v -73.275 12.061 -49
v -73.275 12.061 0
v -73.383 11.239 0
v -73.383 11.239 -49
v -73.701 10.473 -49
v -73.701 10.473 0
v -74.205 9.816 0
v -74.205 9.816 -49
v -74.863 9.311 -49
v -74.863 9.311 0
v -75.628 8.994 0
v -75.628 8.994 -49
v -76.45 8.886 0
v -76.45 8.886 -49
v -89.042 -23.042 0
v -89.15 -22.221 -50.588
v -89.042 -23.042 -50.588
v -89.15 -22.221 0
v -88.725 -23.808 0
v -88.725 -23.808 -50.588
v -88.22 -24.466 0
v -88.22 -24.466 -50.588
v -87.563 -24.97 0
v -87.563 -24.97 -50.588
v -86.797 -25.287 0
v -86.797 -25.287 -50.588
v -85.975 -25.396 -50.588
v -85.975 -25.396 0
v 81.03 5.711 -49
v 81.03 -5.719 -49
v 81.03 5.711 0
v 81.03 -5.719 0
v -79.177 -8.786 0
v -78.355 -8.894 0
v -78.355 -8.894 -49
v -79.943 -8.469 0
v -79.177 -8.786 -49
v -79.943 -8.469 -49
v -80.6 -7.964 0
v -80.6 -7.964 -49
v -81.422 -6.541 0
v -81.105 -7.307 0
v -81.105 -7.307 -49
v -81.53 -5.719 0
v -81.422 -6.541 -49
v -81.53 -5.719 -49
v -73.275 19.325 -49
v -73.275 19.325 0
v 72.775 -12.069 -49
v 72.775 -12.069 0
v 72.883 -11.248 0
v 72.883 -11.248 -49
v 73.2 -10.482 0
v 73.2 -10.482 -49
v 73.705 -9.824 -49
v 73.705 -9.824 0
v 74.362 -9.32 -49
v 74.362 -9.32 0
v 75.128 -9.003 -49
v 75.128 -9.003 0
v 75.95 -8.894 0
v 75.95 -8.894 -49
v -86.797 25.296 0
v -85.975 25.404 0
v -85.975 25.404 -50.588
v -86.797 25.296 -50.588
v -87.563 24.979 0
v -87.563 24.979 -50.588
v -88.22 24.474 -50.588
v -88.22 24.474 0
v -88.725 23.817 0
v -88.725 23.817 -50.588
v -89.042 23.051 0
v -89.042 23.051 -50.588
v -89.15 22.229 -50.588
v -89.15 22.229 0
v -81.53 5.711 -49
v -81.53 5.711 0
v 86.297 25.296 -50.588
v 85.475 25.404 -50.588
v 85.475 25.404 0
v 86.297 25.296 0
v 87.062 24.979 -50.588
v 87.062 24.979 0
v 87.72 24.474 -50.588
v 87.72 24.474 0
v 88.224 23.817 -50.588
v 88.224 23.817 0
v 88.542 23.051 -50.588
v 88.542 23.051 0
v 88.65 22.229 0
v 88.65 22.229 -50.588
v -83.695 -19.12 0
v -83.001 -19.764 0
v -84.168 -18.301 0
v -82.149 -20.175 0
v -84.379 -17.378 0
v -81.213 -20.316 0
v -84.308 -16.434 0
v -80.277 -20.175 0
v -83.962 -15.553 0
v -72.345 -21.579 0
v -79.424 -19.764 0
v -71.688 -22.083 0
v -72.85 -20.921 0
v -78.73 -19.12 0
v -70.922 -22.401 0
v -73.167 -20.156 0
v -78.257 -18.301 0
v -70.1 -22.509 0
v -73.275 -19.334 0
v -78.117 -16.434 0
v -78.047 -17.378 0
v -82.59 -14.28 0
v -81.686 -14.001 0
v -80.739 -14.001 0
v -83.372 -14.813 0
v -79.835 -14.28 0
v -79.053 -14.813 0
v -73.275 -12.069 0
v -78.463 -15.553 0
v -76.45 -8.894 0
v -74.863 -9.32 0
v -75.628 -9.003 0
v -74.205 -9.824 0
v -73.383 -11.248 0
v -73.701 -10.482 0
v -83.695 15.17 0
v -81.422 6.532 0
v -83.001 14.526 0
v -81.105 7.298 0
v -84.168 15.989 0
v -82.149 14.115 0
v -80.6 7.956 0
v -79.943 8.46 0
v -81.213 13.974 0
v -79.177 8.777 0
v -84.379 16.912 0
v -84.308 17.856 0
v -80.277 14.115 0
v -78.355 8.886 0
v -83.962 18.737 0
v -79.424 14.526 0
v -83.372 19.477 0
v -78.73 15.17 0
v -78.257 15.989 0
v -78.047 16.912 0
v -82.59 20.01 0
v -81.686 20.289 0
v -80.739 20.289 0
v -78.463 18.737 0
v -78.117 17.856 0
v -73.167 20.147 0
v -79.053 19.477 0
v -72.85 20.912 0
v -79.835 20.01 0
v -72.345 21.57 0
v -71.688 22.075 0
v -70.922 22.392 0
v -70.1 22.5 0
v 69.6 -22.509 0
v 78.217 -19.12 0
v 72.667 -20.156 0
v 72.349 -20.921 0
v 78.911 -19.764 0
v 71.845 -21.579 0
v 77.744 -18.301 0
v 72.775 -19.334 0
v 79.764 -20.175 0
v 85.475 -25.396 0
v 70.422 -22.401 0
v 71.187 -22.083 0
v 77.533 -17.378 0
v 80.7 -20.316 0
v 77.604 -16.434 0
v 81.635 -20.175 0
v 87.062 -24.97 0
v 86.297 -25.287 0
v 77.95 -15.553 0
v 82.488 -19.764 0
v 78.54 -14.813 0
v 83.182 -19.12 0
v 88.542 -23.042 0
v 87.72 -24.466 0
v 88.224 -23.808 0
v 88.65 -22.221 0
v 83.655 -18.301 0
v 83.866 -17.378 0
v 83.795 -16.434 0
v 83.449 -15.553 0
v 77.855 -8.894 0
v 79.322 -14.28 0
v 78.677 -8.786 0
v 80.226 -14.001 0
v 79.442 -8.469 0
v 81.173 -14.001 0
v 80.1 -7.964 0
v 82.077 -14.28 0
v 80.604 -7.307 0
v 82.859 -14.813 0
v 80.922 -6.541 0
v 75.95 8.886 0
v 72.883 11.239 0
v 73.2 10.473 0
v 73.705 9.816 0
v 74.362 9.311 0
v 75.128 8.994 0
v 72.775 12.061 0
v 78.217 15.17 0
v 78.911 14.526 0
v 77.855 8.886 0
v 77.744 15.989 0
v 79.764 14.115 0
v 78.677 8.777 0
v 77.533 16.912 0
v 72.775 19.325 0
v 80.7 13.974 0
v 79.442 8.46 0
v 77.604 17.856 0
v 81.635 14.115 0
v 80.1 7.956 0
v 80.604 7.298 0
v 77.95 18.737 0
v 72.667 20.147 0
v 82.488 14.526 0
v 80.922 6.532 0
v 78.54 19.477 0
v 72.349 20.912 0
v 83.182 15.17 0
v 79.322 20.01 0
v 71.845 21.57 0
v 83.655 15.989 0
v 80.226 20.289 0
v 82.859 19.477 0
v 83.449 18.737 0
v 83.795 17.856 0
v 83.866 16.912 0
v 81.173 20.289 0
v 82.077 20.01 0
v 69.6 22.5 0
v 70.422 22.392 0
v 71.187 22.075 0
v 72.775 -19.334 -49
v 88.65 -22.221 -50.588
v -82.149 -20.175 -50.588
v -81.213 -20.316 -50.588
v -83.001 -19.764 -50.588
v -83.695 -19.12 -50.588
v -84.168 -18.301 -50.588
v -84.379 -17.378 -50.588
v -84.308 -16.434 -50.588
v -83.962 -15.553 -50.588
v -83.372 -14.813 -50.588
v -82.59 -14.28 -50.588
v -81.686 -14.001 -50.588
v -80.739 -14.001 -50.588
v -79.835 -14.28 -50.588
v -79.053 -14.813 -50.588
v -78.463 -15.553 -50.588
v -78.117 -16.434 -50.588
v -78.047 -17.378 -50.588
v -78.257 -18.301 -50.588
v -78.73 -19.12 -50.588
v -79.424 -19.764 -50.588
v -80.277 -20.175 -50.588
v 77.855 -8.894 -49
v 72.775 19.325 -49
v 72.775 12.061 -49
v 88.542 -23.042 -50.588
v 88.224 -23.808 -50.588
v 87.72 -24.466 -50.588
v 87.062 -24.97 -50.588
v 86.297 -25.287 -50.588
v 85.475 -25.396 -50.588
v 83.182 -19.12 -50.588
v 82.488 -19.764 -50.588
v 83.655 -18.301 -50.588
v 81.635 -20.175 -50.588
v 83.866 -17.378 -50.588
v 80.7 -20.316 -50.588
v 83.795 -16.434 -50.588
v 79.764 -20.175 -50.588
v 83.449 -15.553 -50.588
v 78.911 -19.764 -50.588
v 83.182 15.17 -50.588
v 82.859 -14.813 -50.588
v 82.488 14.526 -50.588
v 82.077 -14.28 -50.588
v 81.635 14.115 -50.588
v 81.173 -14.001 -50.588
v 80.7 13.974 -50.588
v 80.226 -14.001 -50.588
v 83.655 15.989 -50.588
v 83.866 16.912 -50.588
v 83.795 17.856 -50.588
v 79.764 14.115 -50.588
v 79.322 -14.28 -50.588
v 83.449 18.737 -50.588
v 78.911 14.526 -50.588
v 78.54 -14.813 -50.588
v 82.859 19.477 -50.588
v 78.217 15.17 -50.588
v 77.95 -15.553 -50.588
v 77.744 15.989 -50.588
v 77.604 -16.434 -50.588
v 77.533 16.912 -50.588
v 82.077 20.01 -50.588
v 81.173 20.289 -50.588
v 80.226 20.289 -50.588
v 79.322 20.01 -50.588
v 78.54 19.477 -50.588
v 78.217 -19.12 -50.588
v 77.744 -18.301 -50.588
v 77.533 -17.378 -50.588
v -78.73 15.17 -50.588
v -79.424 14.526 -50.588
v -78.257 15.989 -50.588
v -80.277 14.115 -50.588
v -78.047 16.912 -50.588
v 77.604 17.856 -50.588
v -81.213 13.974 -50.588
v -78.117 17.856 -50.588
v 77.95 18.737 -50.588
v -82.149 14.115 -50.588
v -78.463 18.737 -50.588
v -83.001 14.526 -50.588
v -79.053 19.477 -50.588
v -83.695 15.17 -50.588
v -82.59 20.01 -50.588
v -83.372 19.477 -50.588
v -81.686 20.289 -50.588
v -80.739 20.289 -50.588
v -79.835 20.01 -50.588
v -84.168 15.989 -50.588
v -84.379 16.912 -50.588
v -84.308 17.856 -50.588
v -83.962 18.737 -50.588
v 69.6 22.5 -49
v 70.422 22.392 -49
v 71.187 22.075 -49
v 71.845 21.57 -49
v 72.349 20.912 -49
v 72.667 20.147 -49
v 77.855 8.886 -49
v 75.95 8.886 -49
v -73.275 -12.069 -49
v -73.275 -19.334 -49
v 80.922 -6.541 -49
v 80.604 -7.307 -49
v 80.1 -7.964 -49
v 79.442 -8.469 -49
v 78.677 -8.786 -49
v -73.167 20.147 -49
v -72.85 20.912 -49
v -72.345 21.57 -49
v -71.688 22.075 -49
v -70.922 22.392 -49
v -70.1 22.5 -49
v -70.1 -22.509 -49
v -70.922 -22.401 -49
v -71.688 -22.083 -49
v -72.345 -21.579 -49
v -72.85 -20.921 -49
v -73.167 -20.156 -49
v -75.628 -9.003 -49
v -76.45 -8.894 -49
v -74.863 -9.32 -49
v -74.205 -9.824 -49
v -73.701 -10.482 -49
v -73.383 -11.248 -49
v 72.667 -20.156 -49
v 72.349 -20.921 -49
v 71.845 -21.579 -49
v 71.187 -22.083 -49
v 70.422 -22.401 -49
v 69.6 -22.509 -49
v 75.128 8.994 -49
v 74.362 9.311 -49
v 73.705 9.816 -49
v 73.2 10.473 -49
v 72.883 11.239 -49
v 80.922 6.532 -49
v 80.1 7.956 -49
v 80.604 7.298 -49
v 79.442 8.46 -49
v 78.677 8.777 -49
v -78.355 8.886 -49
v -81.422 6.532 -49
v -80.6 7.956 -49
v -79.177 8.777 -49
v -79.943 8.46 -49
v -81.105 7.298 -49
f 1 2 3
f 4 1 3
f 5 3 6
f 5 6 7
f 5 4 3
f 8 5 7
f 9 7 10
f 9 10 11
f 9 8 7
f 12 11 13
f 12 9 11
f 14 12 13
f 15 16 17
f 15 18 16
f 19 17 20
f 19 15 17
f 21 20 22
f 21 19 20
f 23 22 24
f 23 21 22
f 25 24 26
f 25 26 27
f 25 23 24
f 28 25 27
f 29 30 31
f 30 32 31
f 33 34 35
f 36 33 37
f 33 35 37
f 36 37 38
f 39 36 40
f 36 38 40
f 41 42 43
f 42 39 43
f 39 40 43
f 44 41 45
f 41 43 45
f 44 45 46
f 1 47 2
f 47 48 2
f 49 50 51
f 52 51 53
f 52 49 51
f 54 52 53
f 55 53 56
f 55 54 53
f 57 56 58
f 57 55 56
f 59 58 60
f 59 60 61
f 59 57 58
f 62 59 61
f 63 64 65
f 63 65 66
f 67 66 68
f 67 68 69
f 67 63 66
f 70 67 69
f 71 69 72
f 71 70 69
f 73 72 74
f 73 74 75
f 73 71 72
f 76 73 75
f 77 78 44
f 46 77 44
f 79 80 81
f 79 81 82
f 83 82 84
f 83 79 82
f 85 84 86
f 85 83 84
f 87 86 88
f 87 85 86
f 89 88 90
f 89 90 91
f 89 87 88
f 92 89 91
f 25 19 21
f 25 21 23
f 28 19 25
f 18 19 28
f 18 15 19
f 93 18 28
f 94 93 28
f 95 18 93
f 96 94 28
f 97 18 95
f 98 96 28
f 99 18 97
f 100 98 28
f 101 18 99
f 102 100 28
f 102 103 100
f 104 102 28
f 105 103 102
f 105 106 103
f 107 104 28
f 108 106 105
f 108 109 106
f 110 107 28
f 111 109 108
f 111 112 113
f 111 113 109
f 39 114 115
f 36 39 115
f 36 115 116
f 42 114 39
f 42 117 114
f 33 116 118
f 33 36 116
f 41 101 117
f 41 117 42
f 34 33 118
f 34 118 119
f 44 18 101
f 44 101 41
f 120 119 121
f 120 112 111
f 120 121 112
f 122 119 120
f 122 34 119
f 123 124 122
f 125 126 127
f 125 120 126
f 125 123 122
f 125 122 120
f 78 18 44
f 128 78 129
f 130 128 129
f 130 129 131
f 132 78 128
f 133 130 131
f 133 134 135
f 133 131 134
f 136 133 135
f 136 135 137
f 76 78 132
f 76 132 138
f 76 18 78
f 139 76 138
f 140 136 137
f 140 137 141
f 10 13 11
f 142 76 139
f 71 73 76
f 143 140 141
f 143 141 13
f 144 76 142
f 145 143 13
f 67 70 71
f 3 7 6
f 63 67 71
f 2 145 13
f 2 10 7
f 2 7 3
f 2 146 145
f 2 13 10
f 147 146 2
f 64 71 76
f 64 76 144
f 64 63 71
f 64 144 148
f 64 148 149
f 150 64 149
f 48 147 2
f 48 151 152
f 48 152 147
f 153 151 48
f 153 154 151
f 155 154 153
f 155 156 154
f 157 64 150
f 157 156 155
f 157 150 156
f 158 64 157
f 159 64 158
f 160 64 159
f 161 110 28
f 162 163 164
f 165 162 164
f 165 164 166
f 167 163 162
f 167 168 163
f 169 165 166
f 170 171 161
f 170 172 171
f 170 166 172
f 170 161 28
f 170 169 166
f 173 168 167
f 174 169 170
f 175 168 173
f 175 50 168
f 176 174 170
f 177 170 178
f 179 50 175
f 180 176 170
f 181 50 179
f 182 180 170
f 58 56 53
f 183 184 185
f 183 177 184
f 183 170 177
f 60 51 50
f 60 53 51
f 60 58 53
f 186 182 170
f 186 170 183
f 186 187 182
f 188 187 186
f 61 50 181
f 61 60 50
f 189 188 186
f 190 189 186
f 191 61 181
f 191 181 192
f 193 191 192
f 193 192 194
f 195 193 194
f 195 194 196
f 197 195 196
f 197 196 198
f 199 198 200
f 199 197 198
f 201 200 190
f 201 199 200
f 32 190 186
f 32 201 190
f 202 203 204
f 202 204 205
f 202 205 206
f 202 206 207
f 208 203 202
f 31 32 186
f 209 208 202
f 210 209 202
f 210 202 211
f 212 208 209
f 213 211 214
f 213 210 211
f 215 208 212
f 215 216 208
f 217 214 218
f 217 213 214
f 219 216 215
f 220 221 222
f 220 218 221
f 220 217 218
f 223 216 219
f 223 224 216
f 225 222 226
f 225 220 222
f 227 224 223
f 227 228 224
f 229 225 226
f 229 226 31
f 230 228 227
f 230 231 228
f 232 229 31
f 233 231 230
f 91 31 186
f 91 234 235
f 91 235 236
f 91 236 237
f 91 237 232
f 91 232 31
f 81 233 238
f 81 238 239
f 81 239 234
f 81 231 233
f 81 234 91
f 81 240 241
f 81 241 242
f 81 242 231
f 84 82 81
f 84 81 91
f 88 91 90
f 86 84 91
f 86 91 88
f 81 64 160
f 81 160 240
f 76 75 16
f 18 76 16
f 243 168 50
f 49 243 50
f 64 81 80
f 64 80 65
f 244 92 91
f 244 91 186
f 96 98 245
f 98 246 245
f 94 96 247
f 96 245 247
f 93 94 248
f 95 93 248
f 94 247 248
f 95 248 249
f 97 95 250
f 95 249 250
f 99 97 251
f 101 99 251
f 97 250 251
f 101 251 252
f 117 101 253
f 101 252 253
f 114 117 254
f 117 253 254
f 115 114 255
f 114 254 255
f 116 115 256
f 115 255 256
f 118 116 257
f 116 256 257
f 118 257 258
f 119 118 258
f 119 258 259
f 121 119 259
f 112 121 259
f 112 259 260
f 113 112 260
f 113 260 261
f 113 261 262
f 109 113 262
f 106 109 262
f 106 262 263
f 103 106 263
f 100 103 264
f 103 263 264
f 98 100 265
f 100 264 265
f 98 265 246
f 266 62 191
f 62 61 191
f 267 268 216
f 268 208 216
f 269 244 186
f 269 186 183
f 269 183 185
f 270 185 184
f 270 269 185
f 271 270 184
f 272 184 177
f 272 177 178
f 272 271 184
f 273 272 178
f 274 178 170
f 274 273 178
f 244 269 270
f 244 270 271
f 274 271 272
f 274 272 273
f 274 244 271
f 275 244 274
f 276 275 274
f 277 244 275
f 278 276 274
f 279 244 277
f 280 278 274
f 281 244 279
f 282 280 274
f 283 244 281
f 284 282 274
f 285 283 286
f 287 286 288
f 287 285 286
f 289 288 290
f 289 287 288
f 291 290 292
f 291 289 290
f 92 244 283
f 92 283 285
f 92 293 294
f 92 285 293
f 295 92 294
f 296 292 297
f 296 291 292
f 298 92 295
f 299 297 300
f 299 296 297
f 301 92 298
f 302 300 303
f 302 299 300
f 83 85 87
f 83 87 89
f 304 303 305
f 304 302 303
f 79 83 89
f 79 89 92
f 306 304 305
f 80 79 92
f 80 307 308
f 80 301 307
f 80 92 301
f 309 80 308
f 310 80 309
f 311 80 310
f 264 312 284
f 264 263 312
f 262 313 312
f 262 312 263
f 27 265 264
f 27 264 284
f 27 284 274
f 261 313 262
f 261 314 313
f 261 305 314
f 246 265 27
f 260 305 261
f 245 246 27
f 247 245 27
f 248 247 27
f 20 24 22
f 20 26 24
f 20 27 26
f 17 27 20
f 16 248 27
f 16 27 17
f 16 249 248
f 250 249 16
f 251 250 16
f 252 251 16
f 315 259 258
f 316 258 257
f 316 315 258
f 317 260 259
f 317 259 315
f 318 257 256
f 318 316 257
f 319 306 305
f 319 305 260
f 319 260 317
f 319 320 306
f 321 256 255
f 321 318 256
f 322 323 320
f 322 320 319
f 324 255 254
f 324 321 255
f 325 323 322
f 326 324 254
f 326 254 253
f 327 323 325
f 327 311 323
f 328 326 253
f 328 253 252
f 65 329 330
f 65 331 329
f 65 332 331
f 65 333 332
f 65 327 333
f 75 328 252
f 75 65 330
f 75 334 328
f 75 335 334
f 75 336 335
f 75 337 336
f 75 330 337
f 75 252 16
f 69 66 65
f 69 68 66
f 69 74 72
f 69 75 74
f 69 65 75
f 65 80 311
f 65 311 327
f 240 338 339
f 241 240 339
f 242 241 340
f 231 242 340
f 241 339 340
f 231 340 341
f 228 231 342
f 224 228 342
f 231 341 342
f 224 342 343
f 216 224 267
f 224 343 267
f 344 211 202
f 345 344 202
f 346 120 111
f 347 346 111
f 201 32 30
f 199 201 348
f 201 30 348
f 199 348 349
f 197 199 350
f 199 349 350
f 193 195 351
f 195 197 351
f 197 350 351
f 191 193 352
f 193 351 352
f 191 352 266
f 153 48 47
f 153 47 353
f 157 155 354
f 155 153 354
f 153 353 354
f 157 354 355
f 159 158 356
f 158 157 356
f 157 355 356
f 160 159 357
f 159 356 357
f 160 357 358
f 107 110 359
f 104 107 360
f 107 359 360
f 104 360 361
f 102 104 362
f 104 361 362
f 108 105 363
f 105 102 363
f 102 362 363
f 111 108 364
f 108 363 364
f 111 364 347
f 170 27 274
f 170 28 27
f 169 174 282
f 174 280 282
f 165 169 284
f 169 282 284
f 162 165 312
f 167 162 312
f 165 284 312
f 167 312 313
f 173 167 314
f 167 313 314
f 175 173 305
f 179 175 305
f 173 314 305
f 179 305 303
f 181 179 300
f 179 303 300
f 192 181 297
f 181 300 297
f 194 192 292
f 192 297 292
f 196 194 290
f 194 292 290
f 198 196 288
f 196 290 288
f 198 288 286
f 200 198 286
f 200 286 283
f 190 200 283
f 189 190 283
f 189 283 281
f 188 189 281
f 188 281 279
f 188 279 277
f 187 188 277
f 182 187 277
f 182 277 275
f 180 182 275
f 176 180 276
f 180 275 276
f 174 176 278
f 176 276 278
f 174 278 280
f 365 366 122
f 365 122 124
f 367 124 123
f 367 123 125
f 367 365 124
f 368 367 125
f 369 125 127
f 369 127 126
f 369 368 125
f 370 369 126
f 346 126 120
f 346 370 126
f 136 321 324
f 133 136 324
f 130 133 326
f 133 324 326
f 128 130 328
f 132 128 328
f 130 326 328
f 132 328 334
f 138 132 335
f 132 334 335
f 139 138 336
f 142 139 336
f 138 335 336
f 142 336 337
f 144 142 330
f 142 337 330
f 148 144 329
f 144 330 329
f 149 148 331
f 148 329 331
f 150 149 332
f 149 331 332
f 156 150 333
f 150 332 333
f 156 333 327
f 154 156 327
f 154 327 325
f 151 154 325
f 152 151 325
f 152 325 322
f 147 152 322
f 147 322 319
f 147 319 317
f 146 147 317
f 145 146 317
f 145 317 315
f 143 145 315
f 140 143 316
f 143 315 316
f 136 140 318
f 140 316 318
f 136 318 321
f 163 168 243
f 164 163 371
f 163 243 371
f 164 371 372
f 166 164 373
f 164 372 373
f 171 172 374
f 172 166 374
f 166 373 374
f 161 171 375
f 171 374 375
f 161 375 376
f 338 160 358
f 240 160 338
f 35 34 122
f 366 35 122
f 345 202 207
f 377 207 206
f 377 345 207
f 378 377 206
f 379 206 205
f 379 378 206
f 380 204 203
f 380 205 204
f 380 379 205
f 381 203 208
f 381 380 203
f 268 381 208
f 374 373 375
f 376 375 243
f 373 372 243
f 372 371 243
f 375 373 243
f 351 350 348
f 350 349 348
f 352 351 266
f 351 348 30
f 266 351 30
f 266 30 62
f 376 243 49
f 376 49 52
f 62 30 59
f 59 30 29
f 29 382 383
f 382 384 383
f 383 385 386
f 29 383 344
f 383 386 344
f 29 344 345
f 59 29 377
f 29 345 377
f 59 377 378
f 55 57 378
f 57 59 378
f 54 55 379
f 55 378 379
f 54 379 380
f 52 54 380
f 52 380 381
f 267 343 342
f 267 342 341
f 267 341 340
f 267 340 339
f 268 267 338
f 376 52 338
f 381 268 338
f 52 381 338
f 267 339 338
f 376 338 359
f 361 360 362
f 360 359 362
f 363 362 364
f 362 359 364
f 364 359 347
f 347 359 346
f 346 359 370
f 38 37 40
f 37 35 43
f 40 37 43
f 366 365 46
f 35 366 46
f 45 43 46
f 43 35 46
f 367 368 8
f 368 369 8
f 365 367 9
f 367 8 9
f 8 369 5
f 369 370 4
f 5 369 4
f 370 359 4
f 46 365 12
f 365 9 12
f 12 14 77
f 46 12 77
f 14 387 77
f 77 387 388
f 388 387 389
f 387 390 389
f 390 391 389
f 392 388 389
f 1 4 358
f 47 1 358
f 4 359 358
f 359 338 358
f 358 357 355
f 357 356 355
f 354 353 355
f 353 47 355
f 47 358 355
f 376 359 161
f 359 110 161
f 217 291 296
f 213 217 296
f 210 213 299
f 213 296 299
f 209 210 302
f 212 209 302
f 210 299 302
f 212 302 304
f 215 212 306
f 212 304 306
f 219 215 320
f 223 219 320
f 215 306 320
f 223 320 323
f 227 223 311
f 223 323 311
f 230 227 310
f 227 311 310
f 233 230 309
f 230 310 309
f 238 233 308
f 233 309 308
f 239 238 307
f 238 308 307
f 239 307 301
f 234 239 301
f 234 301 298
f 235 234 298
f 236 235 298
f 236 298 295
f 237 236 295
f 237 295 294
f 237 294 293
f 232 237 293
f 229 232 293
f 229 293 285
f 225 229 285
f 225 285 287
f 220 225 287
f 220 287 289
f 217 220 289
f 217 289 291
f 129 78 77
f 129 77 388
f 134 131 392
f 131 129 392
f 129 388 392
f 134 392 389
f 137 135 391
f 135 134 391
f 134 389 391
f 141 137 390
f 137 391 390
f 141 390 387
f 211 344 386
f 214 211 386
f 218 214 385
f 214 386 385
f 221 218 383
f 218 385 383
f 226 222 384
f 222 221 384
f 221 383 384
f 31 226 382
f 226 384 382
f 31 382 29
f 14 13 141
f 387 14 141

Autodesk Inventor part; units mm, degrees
ref_plane "YZ Plane" through (0, 0, 0) normal (1, 0, 0) x (0, 1, 0)
ref_plane "XZ Plane" through (0, 0, 0) normal (0, 1, 0) x (-1, 0, 0)
sketch "Sketch1" plane through (0, 0, 0) normal (0, 0, 1) x (1, 0, 0)
  arc A0 (68.5, 19.5) -> (65.5, 22.5) centre (65.5, 19.5) ccw projected
  line L0 (-65.5, 22.5) -> (65.5, 22.5) projected
  arc A1 (-65.5, 22.5) -> (-68.5, 19.5) centre (-65.5, 19.5) ccw projected
  line L1 (-68.5, -19.5) -> (-68.5, 19.5) projected
  arc A2 (-68.5, -19.5) -> (-65.5, -22.5) centre (-65.5, -19.5) ccw projected
  line L2 (65.5, -22.5) -> (-65.5, -22.5) projected
  arc A3 (65.5, -22.5) -> (68.5, -19.5) centre (65.5, -19.5) ccw projected
  line L3 (68.5, 19.5) -> (68.5, -19.5) projected
  line L4 (88.6498, -25.3956) -> (-89.1502, -25.3956)
  line L5 (-89.1502, -25.3956) -> (-89.1502, 25.4044)
  line L6 (-89.1502, 25.4044) -> (88.6498, 25.4044)
  line L7 (88.6498, 25.4044) -> (88.6498, -25.3956)
  line L8 (-0.2502, 266.6127) -> (-0.2502, -243.9407)
  point P0 (0, 0)
  dimension "d23" = 177.8
  dimension "d24" = 50.8
ref_plane "Work Plane1" through (-104.8982, -25.3956, -49) normal (0, 0, 1) x (1, 0, 0)
extrude "Extrusion1" add sketch "Sketch1" against normal up to surface (49 mm away) contours A0 L0 L8 L6 L7 L4 L2 A3 L3 | L0 A1 L1 A2 L2 L8 L4 L5 L6
sketch "Sketch2" plane through (0, 0, 0) normal (0, 0, 1) x (1, 0, 0)
  line L0 (88.6498, -25.3956) -> (88.6498, 25.4044) projected
  line L1 (-89.1502, 25.4044) -> (-89.1502, -25.3956) projected
  arc A0 (68.5, 19.5) -> (65.5, 22.5) centre (65.5, 19.5) ccw projected
  line L2 (68.5, 19.5) -> (68.5, -19.5) projected
  arc A1 (65.5, -22.5) -> (68.5, -19.5) centre (65.5, -19.5) ccw projected
  line L3 (65.5, -22.5) -> (-65.5, -22.5) projected
  arc A2 (-68.5, -19.5) -> (-65.5, -22.5) centre (-65.5, -19.5) ccw projected
  line L4 (-68.5, -19.5) -> (-68.5, 19.5) projected
  arc A3 (-65.5, 22.5) -> (-68.5, 19.5) centre (-65.5, 19.5) ccw projected
  line L5 (-65.5, 22.5) -> (65.5, 22.5) projected
  line L6 (65.5, 22.5) -> (-65.5, 22.5) projected
  line L7 (-65.5, 22.5) -> (-73.2752, 22.5)
  line L8 (-73.2752, 22.5) -> (-73.2752, 8.8856)
  line L9 (-73.2752, 8.8856) -> (-81.5302, 8.8856)
  line L10 (-81.5302, 8.8856) -> (-81.5302, -8.8944)
  line L11 (-81.5302, -8.8944) -> (-73.2752, -8.8944)
  line L12 (-73.2752, -8.8944) -> (-73.2752, -22.5088)
  line L13 (-73.2752, -22.5088) -> (72.7748, -22.5088)
  line L14 (72.7748, -22.5088) -> (72.7748, -8.8944)
  line L15 (72.7748, -8.8944) -> (81.0298, -8.8944)
  line L16 (81.0298, -8.8944) -> (81.0298, 8.8856)
  line L17 (81.0298, 8.8856) -> (72.7748, 8.8856)
  line L18 (72.7748, 8.8856) -> (72.7748, 22.5)
  line L19 (-65.5, 22.5) -> (72.7748, 22.5)
  line L20 (88.6498, 25.4044) -> (-89.1502, 25.4044) projected
  line L21 (-89.1502, -25.3956) -> (88.6498, -25.3956) projected
  point P0 (0, 0)
  dimension "d4" = 45.0088
  dimension "d5" = 17.78
  dimension "d6" = 7.62
  dimension "d7" = 7.62
  dimension "d8" = 146.05
extrude "Extrusion2" cut sketch "Sketch2" against normal up to next contours A0 L19 L18 L17 L16 L15 L14 L13 L12 L11 L10 L9 L8 L7 A3 L4 A2 L3 A1 L2
sketch "Sketch5" plane through (88.6498, 25.4044, -49) normal (0, 0, -1) x (-1, 0, 0)
  line L0 (0, 0) -> (0, -50.8) projected
  line L1 (177.8, -50.8) -> (0, -50.8) projected
  line L2 (0, 0) -> (177.8, 0)
  line L3 (177.8, 0) -> (177.8, -50.8)
  line L4 (177.8, -50.8) -> (0, -50.8)
  line L5 (0, -50.8) -> (0, 0)
  point P0 (88.6498, -25.4044)
fillet "Fillet2" radius 3.175 12 edges at (-73.2752, 8.8856, -24.5) (-73.2752, 22.5, -24.5) (-81.5302, 8.8856, -24.5) (-81.5302, -8.8944, -24.5) (-73.2752, -8.8944, -24.5) (-73.2752, -22.5088, -24.5) (72.7748, -22.5088, -24.5) (72.7748, -8.8944, -24.5) (81.0298, -8.8944, -24.5) (81.0298, 8.8856, -24.5) (72.7748, 8.8856, -24.5) (72.7748, 22.5, -24.5)
sketch "Sketch6" plane through (0, 0, 0) normal (0, 0, 1) x (1, 0, 0)
  line L0 (-89.1502, 25.4044) -> (-89.1502, -25.3956) projected
  line L1 (-89.1502, -25.3956) -> (88.6498, -25.3956) projected
  line L2 (88.6498, 25.4044) -> (-89.1502, 25.4044) projected
  line L3 (88.6498, -25.3956) -> (88.6498, 25.4044) projected
  point P0 (0, 0)
  point P1 (-81.2127, 17.1494)
  point P2 (-81.2127, -17.1406)
  point P3 (80.6996, -17.1406)
  point P4 (80.6996, 17.1494)
  dimension "d26" = 7.9375
  dimension "d27" = 8.255
  dimension "d28" = 8.255
  dimension "d29" = 7.9502
extrude "Extrusion3" add sketch "Sketch5" along normal blind 1.5875
hole "Hole2" at (-81.2127, 17.1494, 0) at (-81.2127, -17.1406, 0) at (80.6996, -17.1406, 0) at (80.6996, 17.1494, 0) direction (0, 0, -1) diameter 6.35 end through all
fillet "Fillet3" radius 3.175 4 edges at (-89.1502, 25.4044, -25.2938) (-89.1502, -25.3956, -25.2938) (88.6498, 25.4044, -25.2938) (88.6498, -25.3956, -25.2938)
properties part number "Battery Holder" material "PC/ABS Plastic"
